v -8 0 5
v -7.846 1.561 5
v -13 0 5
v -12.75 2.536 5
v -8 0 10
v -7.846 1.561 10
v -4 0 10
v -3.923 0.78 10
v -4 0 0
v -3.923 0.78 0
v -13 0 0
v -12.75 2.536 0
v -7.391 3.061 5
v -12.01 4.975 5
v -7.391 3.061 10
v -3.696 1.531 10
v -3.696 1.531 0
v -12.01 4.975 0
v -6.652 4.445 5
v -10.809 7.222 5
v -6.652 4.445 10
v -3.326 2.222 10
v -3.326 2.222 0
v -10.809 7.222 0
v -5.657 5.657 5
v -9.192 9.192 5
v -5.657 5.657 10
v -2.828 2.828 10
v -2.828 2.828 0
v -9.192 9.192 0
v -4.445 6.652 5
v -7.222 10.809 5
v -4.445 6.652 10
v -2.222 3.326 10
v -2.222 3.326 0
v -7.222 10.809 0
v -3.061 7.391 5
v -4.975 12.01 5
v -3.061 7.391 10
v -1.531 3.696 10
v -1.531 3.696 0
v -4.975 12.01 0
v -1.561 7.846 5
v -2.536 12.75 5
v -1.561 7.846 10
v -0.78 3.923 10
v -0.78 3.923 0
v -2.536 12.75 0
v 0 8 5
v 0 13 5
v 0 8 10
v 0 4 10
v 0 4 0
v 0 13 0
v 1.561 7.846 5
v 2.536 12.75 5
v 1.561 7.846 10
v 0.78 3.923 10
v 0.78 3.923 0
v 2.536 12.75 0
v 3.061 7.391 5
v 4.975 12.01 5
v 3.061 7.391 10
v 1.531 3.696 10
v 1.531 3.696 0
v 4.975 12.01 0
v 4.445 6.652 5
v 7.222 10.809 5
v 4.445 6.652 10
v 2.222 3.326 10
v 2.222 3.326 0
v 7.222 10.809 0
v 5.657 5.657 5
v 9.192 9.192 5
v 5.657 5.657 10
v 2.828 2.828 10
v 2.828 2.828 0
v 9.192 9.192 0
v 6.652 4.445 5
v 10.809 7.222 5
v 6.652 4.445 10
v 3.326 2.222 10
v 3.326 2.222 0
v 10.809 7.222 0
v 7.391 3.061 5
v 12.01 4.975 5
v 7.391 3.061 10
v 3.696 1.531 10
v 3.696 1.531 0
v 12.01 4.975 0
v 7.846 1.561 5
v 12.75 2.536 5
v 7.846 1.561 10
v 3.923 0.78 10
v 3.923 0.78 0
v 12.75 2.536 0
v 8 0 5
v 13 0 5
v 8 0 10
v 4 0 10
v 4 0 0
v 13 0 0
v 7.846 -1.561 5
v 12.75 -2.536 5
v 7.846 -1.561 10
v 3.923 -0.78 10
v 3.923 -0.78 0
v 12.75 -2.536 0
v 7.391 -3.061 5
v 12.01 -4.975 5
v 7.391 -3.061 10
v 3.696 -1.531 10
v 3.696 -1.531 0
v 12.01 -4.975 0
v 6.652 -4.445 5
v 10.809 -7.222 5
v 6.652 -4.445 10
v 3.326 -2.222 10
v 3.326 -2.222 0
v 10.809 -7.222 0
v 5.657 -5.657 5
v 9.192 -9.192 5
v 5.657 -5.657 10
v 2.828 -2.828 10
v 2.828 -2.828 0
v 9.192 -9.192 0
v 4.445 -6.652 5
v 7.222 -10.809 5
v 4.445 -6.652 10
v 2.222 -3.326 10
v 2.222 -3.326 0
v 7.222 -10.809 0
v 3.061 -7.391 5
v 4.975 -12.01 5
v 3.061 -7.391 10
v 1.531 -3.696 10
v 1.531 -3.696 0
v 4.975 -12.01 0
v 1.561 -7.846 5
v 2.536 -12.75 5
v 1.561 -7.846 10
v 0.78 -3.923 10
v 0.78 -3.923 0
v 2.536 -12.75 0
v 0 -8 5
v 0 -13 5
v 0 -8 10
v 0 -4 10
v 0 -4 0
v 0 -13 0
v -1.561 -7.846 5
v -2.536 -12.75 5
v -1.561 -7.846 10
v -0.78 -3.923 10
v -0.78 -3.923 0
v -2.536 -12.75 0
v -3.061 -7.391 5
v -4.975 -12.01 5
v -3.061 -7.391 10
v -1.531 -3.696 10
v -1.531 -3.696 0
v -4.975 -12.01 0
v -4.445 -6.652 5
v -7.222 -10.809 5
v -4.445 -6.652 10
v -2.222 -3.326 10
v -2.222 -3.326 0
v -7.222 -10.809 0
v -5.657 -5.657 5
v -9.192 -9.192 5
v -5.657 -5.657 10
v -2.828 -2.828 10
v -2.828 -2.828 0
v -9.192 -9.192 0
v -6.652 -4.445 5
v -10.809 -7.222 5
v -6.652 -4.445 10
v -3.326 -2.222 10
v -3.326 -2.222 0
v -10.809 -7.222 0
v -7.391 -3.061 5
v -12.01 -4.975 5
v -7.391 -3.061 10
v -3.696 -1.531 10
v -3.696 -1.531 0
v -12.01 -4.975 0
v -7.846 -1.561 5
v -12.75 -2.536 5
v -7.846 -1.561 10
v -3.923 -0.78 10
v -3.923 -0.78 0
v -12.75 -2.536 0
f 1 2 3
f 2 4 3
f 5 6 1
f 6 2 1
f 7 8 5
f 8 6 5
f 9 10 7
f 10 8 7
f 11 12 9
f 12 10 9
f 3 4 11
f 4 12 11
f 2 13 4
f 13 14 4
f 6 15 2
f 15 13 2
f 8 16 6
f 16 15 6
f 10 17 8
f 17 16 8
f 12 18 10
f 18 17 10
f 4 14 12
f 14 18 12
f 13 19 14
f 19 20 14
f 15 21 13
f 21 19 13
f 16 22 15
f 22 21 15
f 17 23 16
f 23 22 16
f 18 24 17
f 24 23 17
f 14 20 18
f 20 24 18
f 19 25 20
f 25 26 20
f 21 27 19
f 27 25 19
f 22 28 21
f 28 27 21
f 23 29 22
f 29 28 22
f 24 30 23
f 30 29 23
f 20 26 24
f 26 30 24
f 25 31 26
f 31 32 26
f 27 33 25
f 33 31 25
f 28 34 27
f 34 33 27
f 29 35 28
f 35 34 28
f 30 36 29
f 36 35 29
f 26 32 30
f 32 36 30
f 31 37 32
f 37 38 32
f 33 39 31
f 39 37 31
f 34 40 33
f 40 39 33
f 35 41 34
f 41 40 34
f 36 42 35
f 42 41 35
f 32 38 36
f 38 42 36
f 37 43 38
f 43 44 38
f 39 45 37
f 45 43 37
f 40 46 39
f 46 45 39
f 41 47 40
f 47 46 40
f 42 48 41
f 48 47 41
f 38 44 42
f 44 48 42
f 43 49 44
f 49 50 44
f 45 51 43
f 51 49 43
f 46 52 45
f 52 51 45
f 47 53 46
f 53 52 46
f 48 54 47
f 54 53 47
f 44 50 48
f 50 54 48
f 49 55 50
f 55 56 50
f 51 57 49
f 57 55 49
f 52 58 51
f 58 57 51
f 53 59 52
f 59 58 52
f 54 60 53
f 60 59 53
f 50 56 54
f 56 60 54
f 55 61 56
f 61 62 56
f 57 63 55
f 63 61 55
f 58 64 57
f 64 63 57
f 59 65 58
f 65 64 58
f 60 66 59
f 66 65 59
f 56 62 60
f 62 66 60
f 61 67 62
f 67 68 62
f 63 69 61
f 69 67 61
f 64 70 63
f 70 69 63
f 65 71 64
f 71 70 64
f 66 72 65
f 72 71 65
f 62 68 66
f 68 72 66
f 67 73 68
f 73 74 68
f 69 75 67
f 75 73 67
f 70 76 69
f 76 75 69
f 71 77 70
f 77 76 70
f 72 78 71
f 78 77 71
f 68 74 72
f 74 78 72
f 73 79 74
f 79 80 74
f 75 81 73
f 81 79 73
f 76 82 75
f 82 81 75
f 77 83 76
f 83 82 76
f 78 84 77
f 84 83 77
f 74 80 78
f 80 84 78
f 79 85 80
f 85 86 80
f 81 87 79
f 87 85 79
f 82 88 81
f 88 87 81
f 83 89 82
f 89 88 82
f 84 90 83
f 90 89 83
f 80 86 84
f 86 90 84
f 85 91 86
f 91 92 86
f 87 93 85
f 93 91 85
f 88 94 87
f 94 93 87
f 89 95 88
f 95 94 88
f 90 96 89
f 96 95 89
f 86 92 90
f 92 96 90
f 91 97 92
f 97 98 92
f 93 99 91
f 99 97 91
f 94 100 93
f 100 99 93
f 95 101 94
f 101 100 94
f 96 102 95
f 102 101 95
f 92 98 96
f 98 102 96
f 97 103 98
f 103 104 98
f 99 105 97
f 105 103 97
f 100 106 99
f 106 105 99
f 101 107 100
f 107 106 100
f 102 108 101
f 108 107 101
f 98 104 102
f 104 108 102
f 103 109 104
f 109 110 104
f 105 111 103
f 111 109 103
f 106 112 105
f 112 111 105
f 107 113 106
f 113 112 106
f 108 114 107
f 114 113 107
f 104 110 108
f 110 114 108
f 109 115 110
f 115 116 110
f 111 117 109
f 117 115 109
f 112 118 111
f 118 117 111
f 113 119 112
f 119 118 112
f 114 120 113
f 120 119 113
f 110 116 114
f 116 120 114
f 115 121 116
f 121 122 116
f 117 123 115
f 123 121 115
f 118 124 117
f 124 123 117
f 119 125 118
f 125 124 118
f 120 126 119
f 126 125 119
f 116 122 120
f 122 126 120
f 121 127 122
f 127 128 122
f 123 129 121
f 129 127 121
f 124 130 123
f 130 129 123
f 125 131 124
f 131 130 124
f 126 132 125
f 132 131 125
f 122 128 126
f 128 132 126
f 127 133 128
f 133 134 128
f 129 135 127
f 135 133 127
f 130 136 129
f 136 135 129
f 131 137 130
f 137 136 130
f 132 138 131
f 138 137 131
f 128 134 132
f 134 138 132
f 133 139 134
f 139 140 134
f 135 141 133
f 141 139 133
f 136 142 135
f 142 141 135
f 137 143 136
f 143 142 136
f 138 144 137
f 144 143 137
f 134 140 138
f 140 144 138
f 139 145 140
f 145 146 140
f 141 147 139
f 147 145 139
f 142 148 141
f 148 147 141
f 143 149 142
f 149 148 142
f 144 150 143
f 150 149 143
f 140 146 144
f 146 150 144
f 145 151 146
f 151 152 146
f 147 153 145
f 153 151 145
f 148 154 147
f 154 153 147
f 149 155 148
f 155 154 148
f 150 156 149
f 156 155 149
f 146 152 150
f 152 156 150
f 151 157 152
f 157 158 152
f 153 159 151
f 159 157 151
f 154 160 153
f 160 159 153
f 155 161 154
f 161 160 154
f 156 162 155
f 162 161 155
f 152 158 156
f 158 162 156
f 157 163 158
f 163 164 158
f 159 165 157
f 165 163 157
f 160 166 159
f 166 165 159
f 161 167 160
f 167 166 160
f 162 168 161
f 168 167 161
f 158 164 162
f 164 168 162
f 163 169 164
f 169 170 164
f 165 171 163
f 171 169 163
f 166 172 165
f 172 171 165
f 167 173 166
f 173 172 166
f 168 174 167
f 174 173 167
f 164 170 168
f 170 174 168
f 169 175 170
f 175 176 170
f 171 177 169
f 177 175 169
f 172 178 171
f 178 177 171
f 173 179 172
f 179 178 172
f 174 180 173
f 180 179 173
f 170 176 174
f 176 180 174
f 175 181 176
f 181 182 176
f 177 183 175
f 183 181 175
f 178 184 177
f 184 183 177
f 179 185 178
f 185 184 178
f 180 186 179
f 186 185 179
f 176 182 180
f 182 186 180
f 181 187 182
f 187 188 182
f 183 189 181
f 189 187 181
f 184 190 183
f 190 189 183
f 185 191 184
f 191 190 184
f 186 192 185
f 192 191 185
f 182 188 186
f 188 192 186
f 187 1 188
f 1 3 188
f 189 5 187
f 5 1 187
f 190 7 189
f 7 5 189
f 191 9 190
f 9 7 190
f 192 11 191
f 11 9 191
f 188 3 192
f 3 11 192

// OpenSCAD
$fn = 32;

// ----------------------------------------------------------------------
// Arc stop: collar, 10 mm thick
// ----------------------------------------------------------------------

// --- parameters (mm) ---
revolve_angle = 360;      // full turn around the Z axis
profile_points = 6;       // points of the closed outline

profile = [[4, 0], [13, 0], [13, 5], [8, 5], [8, 10], [4, 10]];  // single closed polygon, 6 points, counter clockwise

// --- the one profile operation ---
rotate_extrude(angle = revolve_angle) polygon(points = profile);
